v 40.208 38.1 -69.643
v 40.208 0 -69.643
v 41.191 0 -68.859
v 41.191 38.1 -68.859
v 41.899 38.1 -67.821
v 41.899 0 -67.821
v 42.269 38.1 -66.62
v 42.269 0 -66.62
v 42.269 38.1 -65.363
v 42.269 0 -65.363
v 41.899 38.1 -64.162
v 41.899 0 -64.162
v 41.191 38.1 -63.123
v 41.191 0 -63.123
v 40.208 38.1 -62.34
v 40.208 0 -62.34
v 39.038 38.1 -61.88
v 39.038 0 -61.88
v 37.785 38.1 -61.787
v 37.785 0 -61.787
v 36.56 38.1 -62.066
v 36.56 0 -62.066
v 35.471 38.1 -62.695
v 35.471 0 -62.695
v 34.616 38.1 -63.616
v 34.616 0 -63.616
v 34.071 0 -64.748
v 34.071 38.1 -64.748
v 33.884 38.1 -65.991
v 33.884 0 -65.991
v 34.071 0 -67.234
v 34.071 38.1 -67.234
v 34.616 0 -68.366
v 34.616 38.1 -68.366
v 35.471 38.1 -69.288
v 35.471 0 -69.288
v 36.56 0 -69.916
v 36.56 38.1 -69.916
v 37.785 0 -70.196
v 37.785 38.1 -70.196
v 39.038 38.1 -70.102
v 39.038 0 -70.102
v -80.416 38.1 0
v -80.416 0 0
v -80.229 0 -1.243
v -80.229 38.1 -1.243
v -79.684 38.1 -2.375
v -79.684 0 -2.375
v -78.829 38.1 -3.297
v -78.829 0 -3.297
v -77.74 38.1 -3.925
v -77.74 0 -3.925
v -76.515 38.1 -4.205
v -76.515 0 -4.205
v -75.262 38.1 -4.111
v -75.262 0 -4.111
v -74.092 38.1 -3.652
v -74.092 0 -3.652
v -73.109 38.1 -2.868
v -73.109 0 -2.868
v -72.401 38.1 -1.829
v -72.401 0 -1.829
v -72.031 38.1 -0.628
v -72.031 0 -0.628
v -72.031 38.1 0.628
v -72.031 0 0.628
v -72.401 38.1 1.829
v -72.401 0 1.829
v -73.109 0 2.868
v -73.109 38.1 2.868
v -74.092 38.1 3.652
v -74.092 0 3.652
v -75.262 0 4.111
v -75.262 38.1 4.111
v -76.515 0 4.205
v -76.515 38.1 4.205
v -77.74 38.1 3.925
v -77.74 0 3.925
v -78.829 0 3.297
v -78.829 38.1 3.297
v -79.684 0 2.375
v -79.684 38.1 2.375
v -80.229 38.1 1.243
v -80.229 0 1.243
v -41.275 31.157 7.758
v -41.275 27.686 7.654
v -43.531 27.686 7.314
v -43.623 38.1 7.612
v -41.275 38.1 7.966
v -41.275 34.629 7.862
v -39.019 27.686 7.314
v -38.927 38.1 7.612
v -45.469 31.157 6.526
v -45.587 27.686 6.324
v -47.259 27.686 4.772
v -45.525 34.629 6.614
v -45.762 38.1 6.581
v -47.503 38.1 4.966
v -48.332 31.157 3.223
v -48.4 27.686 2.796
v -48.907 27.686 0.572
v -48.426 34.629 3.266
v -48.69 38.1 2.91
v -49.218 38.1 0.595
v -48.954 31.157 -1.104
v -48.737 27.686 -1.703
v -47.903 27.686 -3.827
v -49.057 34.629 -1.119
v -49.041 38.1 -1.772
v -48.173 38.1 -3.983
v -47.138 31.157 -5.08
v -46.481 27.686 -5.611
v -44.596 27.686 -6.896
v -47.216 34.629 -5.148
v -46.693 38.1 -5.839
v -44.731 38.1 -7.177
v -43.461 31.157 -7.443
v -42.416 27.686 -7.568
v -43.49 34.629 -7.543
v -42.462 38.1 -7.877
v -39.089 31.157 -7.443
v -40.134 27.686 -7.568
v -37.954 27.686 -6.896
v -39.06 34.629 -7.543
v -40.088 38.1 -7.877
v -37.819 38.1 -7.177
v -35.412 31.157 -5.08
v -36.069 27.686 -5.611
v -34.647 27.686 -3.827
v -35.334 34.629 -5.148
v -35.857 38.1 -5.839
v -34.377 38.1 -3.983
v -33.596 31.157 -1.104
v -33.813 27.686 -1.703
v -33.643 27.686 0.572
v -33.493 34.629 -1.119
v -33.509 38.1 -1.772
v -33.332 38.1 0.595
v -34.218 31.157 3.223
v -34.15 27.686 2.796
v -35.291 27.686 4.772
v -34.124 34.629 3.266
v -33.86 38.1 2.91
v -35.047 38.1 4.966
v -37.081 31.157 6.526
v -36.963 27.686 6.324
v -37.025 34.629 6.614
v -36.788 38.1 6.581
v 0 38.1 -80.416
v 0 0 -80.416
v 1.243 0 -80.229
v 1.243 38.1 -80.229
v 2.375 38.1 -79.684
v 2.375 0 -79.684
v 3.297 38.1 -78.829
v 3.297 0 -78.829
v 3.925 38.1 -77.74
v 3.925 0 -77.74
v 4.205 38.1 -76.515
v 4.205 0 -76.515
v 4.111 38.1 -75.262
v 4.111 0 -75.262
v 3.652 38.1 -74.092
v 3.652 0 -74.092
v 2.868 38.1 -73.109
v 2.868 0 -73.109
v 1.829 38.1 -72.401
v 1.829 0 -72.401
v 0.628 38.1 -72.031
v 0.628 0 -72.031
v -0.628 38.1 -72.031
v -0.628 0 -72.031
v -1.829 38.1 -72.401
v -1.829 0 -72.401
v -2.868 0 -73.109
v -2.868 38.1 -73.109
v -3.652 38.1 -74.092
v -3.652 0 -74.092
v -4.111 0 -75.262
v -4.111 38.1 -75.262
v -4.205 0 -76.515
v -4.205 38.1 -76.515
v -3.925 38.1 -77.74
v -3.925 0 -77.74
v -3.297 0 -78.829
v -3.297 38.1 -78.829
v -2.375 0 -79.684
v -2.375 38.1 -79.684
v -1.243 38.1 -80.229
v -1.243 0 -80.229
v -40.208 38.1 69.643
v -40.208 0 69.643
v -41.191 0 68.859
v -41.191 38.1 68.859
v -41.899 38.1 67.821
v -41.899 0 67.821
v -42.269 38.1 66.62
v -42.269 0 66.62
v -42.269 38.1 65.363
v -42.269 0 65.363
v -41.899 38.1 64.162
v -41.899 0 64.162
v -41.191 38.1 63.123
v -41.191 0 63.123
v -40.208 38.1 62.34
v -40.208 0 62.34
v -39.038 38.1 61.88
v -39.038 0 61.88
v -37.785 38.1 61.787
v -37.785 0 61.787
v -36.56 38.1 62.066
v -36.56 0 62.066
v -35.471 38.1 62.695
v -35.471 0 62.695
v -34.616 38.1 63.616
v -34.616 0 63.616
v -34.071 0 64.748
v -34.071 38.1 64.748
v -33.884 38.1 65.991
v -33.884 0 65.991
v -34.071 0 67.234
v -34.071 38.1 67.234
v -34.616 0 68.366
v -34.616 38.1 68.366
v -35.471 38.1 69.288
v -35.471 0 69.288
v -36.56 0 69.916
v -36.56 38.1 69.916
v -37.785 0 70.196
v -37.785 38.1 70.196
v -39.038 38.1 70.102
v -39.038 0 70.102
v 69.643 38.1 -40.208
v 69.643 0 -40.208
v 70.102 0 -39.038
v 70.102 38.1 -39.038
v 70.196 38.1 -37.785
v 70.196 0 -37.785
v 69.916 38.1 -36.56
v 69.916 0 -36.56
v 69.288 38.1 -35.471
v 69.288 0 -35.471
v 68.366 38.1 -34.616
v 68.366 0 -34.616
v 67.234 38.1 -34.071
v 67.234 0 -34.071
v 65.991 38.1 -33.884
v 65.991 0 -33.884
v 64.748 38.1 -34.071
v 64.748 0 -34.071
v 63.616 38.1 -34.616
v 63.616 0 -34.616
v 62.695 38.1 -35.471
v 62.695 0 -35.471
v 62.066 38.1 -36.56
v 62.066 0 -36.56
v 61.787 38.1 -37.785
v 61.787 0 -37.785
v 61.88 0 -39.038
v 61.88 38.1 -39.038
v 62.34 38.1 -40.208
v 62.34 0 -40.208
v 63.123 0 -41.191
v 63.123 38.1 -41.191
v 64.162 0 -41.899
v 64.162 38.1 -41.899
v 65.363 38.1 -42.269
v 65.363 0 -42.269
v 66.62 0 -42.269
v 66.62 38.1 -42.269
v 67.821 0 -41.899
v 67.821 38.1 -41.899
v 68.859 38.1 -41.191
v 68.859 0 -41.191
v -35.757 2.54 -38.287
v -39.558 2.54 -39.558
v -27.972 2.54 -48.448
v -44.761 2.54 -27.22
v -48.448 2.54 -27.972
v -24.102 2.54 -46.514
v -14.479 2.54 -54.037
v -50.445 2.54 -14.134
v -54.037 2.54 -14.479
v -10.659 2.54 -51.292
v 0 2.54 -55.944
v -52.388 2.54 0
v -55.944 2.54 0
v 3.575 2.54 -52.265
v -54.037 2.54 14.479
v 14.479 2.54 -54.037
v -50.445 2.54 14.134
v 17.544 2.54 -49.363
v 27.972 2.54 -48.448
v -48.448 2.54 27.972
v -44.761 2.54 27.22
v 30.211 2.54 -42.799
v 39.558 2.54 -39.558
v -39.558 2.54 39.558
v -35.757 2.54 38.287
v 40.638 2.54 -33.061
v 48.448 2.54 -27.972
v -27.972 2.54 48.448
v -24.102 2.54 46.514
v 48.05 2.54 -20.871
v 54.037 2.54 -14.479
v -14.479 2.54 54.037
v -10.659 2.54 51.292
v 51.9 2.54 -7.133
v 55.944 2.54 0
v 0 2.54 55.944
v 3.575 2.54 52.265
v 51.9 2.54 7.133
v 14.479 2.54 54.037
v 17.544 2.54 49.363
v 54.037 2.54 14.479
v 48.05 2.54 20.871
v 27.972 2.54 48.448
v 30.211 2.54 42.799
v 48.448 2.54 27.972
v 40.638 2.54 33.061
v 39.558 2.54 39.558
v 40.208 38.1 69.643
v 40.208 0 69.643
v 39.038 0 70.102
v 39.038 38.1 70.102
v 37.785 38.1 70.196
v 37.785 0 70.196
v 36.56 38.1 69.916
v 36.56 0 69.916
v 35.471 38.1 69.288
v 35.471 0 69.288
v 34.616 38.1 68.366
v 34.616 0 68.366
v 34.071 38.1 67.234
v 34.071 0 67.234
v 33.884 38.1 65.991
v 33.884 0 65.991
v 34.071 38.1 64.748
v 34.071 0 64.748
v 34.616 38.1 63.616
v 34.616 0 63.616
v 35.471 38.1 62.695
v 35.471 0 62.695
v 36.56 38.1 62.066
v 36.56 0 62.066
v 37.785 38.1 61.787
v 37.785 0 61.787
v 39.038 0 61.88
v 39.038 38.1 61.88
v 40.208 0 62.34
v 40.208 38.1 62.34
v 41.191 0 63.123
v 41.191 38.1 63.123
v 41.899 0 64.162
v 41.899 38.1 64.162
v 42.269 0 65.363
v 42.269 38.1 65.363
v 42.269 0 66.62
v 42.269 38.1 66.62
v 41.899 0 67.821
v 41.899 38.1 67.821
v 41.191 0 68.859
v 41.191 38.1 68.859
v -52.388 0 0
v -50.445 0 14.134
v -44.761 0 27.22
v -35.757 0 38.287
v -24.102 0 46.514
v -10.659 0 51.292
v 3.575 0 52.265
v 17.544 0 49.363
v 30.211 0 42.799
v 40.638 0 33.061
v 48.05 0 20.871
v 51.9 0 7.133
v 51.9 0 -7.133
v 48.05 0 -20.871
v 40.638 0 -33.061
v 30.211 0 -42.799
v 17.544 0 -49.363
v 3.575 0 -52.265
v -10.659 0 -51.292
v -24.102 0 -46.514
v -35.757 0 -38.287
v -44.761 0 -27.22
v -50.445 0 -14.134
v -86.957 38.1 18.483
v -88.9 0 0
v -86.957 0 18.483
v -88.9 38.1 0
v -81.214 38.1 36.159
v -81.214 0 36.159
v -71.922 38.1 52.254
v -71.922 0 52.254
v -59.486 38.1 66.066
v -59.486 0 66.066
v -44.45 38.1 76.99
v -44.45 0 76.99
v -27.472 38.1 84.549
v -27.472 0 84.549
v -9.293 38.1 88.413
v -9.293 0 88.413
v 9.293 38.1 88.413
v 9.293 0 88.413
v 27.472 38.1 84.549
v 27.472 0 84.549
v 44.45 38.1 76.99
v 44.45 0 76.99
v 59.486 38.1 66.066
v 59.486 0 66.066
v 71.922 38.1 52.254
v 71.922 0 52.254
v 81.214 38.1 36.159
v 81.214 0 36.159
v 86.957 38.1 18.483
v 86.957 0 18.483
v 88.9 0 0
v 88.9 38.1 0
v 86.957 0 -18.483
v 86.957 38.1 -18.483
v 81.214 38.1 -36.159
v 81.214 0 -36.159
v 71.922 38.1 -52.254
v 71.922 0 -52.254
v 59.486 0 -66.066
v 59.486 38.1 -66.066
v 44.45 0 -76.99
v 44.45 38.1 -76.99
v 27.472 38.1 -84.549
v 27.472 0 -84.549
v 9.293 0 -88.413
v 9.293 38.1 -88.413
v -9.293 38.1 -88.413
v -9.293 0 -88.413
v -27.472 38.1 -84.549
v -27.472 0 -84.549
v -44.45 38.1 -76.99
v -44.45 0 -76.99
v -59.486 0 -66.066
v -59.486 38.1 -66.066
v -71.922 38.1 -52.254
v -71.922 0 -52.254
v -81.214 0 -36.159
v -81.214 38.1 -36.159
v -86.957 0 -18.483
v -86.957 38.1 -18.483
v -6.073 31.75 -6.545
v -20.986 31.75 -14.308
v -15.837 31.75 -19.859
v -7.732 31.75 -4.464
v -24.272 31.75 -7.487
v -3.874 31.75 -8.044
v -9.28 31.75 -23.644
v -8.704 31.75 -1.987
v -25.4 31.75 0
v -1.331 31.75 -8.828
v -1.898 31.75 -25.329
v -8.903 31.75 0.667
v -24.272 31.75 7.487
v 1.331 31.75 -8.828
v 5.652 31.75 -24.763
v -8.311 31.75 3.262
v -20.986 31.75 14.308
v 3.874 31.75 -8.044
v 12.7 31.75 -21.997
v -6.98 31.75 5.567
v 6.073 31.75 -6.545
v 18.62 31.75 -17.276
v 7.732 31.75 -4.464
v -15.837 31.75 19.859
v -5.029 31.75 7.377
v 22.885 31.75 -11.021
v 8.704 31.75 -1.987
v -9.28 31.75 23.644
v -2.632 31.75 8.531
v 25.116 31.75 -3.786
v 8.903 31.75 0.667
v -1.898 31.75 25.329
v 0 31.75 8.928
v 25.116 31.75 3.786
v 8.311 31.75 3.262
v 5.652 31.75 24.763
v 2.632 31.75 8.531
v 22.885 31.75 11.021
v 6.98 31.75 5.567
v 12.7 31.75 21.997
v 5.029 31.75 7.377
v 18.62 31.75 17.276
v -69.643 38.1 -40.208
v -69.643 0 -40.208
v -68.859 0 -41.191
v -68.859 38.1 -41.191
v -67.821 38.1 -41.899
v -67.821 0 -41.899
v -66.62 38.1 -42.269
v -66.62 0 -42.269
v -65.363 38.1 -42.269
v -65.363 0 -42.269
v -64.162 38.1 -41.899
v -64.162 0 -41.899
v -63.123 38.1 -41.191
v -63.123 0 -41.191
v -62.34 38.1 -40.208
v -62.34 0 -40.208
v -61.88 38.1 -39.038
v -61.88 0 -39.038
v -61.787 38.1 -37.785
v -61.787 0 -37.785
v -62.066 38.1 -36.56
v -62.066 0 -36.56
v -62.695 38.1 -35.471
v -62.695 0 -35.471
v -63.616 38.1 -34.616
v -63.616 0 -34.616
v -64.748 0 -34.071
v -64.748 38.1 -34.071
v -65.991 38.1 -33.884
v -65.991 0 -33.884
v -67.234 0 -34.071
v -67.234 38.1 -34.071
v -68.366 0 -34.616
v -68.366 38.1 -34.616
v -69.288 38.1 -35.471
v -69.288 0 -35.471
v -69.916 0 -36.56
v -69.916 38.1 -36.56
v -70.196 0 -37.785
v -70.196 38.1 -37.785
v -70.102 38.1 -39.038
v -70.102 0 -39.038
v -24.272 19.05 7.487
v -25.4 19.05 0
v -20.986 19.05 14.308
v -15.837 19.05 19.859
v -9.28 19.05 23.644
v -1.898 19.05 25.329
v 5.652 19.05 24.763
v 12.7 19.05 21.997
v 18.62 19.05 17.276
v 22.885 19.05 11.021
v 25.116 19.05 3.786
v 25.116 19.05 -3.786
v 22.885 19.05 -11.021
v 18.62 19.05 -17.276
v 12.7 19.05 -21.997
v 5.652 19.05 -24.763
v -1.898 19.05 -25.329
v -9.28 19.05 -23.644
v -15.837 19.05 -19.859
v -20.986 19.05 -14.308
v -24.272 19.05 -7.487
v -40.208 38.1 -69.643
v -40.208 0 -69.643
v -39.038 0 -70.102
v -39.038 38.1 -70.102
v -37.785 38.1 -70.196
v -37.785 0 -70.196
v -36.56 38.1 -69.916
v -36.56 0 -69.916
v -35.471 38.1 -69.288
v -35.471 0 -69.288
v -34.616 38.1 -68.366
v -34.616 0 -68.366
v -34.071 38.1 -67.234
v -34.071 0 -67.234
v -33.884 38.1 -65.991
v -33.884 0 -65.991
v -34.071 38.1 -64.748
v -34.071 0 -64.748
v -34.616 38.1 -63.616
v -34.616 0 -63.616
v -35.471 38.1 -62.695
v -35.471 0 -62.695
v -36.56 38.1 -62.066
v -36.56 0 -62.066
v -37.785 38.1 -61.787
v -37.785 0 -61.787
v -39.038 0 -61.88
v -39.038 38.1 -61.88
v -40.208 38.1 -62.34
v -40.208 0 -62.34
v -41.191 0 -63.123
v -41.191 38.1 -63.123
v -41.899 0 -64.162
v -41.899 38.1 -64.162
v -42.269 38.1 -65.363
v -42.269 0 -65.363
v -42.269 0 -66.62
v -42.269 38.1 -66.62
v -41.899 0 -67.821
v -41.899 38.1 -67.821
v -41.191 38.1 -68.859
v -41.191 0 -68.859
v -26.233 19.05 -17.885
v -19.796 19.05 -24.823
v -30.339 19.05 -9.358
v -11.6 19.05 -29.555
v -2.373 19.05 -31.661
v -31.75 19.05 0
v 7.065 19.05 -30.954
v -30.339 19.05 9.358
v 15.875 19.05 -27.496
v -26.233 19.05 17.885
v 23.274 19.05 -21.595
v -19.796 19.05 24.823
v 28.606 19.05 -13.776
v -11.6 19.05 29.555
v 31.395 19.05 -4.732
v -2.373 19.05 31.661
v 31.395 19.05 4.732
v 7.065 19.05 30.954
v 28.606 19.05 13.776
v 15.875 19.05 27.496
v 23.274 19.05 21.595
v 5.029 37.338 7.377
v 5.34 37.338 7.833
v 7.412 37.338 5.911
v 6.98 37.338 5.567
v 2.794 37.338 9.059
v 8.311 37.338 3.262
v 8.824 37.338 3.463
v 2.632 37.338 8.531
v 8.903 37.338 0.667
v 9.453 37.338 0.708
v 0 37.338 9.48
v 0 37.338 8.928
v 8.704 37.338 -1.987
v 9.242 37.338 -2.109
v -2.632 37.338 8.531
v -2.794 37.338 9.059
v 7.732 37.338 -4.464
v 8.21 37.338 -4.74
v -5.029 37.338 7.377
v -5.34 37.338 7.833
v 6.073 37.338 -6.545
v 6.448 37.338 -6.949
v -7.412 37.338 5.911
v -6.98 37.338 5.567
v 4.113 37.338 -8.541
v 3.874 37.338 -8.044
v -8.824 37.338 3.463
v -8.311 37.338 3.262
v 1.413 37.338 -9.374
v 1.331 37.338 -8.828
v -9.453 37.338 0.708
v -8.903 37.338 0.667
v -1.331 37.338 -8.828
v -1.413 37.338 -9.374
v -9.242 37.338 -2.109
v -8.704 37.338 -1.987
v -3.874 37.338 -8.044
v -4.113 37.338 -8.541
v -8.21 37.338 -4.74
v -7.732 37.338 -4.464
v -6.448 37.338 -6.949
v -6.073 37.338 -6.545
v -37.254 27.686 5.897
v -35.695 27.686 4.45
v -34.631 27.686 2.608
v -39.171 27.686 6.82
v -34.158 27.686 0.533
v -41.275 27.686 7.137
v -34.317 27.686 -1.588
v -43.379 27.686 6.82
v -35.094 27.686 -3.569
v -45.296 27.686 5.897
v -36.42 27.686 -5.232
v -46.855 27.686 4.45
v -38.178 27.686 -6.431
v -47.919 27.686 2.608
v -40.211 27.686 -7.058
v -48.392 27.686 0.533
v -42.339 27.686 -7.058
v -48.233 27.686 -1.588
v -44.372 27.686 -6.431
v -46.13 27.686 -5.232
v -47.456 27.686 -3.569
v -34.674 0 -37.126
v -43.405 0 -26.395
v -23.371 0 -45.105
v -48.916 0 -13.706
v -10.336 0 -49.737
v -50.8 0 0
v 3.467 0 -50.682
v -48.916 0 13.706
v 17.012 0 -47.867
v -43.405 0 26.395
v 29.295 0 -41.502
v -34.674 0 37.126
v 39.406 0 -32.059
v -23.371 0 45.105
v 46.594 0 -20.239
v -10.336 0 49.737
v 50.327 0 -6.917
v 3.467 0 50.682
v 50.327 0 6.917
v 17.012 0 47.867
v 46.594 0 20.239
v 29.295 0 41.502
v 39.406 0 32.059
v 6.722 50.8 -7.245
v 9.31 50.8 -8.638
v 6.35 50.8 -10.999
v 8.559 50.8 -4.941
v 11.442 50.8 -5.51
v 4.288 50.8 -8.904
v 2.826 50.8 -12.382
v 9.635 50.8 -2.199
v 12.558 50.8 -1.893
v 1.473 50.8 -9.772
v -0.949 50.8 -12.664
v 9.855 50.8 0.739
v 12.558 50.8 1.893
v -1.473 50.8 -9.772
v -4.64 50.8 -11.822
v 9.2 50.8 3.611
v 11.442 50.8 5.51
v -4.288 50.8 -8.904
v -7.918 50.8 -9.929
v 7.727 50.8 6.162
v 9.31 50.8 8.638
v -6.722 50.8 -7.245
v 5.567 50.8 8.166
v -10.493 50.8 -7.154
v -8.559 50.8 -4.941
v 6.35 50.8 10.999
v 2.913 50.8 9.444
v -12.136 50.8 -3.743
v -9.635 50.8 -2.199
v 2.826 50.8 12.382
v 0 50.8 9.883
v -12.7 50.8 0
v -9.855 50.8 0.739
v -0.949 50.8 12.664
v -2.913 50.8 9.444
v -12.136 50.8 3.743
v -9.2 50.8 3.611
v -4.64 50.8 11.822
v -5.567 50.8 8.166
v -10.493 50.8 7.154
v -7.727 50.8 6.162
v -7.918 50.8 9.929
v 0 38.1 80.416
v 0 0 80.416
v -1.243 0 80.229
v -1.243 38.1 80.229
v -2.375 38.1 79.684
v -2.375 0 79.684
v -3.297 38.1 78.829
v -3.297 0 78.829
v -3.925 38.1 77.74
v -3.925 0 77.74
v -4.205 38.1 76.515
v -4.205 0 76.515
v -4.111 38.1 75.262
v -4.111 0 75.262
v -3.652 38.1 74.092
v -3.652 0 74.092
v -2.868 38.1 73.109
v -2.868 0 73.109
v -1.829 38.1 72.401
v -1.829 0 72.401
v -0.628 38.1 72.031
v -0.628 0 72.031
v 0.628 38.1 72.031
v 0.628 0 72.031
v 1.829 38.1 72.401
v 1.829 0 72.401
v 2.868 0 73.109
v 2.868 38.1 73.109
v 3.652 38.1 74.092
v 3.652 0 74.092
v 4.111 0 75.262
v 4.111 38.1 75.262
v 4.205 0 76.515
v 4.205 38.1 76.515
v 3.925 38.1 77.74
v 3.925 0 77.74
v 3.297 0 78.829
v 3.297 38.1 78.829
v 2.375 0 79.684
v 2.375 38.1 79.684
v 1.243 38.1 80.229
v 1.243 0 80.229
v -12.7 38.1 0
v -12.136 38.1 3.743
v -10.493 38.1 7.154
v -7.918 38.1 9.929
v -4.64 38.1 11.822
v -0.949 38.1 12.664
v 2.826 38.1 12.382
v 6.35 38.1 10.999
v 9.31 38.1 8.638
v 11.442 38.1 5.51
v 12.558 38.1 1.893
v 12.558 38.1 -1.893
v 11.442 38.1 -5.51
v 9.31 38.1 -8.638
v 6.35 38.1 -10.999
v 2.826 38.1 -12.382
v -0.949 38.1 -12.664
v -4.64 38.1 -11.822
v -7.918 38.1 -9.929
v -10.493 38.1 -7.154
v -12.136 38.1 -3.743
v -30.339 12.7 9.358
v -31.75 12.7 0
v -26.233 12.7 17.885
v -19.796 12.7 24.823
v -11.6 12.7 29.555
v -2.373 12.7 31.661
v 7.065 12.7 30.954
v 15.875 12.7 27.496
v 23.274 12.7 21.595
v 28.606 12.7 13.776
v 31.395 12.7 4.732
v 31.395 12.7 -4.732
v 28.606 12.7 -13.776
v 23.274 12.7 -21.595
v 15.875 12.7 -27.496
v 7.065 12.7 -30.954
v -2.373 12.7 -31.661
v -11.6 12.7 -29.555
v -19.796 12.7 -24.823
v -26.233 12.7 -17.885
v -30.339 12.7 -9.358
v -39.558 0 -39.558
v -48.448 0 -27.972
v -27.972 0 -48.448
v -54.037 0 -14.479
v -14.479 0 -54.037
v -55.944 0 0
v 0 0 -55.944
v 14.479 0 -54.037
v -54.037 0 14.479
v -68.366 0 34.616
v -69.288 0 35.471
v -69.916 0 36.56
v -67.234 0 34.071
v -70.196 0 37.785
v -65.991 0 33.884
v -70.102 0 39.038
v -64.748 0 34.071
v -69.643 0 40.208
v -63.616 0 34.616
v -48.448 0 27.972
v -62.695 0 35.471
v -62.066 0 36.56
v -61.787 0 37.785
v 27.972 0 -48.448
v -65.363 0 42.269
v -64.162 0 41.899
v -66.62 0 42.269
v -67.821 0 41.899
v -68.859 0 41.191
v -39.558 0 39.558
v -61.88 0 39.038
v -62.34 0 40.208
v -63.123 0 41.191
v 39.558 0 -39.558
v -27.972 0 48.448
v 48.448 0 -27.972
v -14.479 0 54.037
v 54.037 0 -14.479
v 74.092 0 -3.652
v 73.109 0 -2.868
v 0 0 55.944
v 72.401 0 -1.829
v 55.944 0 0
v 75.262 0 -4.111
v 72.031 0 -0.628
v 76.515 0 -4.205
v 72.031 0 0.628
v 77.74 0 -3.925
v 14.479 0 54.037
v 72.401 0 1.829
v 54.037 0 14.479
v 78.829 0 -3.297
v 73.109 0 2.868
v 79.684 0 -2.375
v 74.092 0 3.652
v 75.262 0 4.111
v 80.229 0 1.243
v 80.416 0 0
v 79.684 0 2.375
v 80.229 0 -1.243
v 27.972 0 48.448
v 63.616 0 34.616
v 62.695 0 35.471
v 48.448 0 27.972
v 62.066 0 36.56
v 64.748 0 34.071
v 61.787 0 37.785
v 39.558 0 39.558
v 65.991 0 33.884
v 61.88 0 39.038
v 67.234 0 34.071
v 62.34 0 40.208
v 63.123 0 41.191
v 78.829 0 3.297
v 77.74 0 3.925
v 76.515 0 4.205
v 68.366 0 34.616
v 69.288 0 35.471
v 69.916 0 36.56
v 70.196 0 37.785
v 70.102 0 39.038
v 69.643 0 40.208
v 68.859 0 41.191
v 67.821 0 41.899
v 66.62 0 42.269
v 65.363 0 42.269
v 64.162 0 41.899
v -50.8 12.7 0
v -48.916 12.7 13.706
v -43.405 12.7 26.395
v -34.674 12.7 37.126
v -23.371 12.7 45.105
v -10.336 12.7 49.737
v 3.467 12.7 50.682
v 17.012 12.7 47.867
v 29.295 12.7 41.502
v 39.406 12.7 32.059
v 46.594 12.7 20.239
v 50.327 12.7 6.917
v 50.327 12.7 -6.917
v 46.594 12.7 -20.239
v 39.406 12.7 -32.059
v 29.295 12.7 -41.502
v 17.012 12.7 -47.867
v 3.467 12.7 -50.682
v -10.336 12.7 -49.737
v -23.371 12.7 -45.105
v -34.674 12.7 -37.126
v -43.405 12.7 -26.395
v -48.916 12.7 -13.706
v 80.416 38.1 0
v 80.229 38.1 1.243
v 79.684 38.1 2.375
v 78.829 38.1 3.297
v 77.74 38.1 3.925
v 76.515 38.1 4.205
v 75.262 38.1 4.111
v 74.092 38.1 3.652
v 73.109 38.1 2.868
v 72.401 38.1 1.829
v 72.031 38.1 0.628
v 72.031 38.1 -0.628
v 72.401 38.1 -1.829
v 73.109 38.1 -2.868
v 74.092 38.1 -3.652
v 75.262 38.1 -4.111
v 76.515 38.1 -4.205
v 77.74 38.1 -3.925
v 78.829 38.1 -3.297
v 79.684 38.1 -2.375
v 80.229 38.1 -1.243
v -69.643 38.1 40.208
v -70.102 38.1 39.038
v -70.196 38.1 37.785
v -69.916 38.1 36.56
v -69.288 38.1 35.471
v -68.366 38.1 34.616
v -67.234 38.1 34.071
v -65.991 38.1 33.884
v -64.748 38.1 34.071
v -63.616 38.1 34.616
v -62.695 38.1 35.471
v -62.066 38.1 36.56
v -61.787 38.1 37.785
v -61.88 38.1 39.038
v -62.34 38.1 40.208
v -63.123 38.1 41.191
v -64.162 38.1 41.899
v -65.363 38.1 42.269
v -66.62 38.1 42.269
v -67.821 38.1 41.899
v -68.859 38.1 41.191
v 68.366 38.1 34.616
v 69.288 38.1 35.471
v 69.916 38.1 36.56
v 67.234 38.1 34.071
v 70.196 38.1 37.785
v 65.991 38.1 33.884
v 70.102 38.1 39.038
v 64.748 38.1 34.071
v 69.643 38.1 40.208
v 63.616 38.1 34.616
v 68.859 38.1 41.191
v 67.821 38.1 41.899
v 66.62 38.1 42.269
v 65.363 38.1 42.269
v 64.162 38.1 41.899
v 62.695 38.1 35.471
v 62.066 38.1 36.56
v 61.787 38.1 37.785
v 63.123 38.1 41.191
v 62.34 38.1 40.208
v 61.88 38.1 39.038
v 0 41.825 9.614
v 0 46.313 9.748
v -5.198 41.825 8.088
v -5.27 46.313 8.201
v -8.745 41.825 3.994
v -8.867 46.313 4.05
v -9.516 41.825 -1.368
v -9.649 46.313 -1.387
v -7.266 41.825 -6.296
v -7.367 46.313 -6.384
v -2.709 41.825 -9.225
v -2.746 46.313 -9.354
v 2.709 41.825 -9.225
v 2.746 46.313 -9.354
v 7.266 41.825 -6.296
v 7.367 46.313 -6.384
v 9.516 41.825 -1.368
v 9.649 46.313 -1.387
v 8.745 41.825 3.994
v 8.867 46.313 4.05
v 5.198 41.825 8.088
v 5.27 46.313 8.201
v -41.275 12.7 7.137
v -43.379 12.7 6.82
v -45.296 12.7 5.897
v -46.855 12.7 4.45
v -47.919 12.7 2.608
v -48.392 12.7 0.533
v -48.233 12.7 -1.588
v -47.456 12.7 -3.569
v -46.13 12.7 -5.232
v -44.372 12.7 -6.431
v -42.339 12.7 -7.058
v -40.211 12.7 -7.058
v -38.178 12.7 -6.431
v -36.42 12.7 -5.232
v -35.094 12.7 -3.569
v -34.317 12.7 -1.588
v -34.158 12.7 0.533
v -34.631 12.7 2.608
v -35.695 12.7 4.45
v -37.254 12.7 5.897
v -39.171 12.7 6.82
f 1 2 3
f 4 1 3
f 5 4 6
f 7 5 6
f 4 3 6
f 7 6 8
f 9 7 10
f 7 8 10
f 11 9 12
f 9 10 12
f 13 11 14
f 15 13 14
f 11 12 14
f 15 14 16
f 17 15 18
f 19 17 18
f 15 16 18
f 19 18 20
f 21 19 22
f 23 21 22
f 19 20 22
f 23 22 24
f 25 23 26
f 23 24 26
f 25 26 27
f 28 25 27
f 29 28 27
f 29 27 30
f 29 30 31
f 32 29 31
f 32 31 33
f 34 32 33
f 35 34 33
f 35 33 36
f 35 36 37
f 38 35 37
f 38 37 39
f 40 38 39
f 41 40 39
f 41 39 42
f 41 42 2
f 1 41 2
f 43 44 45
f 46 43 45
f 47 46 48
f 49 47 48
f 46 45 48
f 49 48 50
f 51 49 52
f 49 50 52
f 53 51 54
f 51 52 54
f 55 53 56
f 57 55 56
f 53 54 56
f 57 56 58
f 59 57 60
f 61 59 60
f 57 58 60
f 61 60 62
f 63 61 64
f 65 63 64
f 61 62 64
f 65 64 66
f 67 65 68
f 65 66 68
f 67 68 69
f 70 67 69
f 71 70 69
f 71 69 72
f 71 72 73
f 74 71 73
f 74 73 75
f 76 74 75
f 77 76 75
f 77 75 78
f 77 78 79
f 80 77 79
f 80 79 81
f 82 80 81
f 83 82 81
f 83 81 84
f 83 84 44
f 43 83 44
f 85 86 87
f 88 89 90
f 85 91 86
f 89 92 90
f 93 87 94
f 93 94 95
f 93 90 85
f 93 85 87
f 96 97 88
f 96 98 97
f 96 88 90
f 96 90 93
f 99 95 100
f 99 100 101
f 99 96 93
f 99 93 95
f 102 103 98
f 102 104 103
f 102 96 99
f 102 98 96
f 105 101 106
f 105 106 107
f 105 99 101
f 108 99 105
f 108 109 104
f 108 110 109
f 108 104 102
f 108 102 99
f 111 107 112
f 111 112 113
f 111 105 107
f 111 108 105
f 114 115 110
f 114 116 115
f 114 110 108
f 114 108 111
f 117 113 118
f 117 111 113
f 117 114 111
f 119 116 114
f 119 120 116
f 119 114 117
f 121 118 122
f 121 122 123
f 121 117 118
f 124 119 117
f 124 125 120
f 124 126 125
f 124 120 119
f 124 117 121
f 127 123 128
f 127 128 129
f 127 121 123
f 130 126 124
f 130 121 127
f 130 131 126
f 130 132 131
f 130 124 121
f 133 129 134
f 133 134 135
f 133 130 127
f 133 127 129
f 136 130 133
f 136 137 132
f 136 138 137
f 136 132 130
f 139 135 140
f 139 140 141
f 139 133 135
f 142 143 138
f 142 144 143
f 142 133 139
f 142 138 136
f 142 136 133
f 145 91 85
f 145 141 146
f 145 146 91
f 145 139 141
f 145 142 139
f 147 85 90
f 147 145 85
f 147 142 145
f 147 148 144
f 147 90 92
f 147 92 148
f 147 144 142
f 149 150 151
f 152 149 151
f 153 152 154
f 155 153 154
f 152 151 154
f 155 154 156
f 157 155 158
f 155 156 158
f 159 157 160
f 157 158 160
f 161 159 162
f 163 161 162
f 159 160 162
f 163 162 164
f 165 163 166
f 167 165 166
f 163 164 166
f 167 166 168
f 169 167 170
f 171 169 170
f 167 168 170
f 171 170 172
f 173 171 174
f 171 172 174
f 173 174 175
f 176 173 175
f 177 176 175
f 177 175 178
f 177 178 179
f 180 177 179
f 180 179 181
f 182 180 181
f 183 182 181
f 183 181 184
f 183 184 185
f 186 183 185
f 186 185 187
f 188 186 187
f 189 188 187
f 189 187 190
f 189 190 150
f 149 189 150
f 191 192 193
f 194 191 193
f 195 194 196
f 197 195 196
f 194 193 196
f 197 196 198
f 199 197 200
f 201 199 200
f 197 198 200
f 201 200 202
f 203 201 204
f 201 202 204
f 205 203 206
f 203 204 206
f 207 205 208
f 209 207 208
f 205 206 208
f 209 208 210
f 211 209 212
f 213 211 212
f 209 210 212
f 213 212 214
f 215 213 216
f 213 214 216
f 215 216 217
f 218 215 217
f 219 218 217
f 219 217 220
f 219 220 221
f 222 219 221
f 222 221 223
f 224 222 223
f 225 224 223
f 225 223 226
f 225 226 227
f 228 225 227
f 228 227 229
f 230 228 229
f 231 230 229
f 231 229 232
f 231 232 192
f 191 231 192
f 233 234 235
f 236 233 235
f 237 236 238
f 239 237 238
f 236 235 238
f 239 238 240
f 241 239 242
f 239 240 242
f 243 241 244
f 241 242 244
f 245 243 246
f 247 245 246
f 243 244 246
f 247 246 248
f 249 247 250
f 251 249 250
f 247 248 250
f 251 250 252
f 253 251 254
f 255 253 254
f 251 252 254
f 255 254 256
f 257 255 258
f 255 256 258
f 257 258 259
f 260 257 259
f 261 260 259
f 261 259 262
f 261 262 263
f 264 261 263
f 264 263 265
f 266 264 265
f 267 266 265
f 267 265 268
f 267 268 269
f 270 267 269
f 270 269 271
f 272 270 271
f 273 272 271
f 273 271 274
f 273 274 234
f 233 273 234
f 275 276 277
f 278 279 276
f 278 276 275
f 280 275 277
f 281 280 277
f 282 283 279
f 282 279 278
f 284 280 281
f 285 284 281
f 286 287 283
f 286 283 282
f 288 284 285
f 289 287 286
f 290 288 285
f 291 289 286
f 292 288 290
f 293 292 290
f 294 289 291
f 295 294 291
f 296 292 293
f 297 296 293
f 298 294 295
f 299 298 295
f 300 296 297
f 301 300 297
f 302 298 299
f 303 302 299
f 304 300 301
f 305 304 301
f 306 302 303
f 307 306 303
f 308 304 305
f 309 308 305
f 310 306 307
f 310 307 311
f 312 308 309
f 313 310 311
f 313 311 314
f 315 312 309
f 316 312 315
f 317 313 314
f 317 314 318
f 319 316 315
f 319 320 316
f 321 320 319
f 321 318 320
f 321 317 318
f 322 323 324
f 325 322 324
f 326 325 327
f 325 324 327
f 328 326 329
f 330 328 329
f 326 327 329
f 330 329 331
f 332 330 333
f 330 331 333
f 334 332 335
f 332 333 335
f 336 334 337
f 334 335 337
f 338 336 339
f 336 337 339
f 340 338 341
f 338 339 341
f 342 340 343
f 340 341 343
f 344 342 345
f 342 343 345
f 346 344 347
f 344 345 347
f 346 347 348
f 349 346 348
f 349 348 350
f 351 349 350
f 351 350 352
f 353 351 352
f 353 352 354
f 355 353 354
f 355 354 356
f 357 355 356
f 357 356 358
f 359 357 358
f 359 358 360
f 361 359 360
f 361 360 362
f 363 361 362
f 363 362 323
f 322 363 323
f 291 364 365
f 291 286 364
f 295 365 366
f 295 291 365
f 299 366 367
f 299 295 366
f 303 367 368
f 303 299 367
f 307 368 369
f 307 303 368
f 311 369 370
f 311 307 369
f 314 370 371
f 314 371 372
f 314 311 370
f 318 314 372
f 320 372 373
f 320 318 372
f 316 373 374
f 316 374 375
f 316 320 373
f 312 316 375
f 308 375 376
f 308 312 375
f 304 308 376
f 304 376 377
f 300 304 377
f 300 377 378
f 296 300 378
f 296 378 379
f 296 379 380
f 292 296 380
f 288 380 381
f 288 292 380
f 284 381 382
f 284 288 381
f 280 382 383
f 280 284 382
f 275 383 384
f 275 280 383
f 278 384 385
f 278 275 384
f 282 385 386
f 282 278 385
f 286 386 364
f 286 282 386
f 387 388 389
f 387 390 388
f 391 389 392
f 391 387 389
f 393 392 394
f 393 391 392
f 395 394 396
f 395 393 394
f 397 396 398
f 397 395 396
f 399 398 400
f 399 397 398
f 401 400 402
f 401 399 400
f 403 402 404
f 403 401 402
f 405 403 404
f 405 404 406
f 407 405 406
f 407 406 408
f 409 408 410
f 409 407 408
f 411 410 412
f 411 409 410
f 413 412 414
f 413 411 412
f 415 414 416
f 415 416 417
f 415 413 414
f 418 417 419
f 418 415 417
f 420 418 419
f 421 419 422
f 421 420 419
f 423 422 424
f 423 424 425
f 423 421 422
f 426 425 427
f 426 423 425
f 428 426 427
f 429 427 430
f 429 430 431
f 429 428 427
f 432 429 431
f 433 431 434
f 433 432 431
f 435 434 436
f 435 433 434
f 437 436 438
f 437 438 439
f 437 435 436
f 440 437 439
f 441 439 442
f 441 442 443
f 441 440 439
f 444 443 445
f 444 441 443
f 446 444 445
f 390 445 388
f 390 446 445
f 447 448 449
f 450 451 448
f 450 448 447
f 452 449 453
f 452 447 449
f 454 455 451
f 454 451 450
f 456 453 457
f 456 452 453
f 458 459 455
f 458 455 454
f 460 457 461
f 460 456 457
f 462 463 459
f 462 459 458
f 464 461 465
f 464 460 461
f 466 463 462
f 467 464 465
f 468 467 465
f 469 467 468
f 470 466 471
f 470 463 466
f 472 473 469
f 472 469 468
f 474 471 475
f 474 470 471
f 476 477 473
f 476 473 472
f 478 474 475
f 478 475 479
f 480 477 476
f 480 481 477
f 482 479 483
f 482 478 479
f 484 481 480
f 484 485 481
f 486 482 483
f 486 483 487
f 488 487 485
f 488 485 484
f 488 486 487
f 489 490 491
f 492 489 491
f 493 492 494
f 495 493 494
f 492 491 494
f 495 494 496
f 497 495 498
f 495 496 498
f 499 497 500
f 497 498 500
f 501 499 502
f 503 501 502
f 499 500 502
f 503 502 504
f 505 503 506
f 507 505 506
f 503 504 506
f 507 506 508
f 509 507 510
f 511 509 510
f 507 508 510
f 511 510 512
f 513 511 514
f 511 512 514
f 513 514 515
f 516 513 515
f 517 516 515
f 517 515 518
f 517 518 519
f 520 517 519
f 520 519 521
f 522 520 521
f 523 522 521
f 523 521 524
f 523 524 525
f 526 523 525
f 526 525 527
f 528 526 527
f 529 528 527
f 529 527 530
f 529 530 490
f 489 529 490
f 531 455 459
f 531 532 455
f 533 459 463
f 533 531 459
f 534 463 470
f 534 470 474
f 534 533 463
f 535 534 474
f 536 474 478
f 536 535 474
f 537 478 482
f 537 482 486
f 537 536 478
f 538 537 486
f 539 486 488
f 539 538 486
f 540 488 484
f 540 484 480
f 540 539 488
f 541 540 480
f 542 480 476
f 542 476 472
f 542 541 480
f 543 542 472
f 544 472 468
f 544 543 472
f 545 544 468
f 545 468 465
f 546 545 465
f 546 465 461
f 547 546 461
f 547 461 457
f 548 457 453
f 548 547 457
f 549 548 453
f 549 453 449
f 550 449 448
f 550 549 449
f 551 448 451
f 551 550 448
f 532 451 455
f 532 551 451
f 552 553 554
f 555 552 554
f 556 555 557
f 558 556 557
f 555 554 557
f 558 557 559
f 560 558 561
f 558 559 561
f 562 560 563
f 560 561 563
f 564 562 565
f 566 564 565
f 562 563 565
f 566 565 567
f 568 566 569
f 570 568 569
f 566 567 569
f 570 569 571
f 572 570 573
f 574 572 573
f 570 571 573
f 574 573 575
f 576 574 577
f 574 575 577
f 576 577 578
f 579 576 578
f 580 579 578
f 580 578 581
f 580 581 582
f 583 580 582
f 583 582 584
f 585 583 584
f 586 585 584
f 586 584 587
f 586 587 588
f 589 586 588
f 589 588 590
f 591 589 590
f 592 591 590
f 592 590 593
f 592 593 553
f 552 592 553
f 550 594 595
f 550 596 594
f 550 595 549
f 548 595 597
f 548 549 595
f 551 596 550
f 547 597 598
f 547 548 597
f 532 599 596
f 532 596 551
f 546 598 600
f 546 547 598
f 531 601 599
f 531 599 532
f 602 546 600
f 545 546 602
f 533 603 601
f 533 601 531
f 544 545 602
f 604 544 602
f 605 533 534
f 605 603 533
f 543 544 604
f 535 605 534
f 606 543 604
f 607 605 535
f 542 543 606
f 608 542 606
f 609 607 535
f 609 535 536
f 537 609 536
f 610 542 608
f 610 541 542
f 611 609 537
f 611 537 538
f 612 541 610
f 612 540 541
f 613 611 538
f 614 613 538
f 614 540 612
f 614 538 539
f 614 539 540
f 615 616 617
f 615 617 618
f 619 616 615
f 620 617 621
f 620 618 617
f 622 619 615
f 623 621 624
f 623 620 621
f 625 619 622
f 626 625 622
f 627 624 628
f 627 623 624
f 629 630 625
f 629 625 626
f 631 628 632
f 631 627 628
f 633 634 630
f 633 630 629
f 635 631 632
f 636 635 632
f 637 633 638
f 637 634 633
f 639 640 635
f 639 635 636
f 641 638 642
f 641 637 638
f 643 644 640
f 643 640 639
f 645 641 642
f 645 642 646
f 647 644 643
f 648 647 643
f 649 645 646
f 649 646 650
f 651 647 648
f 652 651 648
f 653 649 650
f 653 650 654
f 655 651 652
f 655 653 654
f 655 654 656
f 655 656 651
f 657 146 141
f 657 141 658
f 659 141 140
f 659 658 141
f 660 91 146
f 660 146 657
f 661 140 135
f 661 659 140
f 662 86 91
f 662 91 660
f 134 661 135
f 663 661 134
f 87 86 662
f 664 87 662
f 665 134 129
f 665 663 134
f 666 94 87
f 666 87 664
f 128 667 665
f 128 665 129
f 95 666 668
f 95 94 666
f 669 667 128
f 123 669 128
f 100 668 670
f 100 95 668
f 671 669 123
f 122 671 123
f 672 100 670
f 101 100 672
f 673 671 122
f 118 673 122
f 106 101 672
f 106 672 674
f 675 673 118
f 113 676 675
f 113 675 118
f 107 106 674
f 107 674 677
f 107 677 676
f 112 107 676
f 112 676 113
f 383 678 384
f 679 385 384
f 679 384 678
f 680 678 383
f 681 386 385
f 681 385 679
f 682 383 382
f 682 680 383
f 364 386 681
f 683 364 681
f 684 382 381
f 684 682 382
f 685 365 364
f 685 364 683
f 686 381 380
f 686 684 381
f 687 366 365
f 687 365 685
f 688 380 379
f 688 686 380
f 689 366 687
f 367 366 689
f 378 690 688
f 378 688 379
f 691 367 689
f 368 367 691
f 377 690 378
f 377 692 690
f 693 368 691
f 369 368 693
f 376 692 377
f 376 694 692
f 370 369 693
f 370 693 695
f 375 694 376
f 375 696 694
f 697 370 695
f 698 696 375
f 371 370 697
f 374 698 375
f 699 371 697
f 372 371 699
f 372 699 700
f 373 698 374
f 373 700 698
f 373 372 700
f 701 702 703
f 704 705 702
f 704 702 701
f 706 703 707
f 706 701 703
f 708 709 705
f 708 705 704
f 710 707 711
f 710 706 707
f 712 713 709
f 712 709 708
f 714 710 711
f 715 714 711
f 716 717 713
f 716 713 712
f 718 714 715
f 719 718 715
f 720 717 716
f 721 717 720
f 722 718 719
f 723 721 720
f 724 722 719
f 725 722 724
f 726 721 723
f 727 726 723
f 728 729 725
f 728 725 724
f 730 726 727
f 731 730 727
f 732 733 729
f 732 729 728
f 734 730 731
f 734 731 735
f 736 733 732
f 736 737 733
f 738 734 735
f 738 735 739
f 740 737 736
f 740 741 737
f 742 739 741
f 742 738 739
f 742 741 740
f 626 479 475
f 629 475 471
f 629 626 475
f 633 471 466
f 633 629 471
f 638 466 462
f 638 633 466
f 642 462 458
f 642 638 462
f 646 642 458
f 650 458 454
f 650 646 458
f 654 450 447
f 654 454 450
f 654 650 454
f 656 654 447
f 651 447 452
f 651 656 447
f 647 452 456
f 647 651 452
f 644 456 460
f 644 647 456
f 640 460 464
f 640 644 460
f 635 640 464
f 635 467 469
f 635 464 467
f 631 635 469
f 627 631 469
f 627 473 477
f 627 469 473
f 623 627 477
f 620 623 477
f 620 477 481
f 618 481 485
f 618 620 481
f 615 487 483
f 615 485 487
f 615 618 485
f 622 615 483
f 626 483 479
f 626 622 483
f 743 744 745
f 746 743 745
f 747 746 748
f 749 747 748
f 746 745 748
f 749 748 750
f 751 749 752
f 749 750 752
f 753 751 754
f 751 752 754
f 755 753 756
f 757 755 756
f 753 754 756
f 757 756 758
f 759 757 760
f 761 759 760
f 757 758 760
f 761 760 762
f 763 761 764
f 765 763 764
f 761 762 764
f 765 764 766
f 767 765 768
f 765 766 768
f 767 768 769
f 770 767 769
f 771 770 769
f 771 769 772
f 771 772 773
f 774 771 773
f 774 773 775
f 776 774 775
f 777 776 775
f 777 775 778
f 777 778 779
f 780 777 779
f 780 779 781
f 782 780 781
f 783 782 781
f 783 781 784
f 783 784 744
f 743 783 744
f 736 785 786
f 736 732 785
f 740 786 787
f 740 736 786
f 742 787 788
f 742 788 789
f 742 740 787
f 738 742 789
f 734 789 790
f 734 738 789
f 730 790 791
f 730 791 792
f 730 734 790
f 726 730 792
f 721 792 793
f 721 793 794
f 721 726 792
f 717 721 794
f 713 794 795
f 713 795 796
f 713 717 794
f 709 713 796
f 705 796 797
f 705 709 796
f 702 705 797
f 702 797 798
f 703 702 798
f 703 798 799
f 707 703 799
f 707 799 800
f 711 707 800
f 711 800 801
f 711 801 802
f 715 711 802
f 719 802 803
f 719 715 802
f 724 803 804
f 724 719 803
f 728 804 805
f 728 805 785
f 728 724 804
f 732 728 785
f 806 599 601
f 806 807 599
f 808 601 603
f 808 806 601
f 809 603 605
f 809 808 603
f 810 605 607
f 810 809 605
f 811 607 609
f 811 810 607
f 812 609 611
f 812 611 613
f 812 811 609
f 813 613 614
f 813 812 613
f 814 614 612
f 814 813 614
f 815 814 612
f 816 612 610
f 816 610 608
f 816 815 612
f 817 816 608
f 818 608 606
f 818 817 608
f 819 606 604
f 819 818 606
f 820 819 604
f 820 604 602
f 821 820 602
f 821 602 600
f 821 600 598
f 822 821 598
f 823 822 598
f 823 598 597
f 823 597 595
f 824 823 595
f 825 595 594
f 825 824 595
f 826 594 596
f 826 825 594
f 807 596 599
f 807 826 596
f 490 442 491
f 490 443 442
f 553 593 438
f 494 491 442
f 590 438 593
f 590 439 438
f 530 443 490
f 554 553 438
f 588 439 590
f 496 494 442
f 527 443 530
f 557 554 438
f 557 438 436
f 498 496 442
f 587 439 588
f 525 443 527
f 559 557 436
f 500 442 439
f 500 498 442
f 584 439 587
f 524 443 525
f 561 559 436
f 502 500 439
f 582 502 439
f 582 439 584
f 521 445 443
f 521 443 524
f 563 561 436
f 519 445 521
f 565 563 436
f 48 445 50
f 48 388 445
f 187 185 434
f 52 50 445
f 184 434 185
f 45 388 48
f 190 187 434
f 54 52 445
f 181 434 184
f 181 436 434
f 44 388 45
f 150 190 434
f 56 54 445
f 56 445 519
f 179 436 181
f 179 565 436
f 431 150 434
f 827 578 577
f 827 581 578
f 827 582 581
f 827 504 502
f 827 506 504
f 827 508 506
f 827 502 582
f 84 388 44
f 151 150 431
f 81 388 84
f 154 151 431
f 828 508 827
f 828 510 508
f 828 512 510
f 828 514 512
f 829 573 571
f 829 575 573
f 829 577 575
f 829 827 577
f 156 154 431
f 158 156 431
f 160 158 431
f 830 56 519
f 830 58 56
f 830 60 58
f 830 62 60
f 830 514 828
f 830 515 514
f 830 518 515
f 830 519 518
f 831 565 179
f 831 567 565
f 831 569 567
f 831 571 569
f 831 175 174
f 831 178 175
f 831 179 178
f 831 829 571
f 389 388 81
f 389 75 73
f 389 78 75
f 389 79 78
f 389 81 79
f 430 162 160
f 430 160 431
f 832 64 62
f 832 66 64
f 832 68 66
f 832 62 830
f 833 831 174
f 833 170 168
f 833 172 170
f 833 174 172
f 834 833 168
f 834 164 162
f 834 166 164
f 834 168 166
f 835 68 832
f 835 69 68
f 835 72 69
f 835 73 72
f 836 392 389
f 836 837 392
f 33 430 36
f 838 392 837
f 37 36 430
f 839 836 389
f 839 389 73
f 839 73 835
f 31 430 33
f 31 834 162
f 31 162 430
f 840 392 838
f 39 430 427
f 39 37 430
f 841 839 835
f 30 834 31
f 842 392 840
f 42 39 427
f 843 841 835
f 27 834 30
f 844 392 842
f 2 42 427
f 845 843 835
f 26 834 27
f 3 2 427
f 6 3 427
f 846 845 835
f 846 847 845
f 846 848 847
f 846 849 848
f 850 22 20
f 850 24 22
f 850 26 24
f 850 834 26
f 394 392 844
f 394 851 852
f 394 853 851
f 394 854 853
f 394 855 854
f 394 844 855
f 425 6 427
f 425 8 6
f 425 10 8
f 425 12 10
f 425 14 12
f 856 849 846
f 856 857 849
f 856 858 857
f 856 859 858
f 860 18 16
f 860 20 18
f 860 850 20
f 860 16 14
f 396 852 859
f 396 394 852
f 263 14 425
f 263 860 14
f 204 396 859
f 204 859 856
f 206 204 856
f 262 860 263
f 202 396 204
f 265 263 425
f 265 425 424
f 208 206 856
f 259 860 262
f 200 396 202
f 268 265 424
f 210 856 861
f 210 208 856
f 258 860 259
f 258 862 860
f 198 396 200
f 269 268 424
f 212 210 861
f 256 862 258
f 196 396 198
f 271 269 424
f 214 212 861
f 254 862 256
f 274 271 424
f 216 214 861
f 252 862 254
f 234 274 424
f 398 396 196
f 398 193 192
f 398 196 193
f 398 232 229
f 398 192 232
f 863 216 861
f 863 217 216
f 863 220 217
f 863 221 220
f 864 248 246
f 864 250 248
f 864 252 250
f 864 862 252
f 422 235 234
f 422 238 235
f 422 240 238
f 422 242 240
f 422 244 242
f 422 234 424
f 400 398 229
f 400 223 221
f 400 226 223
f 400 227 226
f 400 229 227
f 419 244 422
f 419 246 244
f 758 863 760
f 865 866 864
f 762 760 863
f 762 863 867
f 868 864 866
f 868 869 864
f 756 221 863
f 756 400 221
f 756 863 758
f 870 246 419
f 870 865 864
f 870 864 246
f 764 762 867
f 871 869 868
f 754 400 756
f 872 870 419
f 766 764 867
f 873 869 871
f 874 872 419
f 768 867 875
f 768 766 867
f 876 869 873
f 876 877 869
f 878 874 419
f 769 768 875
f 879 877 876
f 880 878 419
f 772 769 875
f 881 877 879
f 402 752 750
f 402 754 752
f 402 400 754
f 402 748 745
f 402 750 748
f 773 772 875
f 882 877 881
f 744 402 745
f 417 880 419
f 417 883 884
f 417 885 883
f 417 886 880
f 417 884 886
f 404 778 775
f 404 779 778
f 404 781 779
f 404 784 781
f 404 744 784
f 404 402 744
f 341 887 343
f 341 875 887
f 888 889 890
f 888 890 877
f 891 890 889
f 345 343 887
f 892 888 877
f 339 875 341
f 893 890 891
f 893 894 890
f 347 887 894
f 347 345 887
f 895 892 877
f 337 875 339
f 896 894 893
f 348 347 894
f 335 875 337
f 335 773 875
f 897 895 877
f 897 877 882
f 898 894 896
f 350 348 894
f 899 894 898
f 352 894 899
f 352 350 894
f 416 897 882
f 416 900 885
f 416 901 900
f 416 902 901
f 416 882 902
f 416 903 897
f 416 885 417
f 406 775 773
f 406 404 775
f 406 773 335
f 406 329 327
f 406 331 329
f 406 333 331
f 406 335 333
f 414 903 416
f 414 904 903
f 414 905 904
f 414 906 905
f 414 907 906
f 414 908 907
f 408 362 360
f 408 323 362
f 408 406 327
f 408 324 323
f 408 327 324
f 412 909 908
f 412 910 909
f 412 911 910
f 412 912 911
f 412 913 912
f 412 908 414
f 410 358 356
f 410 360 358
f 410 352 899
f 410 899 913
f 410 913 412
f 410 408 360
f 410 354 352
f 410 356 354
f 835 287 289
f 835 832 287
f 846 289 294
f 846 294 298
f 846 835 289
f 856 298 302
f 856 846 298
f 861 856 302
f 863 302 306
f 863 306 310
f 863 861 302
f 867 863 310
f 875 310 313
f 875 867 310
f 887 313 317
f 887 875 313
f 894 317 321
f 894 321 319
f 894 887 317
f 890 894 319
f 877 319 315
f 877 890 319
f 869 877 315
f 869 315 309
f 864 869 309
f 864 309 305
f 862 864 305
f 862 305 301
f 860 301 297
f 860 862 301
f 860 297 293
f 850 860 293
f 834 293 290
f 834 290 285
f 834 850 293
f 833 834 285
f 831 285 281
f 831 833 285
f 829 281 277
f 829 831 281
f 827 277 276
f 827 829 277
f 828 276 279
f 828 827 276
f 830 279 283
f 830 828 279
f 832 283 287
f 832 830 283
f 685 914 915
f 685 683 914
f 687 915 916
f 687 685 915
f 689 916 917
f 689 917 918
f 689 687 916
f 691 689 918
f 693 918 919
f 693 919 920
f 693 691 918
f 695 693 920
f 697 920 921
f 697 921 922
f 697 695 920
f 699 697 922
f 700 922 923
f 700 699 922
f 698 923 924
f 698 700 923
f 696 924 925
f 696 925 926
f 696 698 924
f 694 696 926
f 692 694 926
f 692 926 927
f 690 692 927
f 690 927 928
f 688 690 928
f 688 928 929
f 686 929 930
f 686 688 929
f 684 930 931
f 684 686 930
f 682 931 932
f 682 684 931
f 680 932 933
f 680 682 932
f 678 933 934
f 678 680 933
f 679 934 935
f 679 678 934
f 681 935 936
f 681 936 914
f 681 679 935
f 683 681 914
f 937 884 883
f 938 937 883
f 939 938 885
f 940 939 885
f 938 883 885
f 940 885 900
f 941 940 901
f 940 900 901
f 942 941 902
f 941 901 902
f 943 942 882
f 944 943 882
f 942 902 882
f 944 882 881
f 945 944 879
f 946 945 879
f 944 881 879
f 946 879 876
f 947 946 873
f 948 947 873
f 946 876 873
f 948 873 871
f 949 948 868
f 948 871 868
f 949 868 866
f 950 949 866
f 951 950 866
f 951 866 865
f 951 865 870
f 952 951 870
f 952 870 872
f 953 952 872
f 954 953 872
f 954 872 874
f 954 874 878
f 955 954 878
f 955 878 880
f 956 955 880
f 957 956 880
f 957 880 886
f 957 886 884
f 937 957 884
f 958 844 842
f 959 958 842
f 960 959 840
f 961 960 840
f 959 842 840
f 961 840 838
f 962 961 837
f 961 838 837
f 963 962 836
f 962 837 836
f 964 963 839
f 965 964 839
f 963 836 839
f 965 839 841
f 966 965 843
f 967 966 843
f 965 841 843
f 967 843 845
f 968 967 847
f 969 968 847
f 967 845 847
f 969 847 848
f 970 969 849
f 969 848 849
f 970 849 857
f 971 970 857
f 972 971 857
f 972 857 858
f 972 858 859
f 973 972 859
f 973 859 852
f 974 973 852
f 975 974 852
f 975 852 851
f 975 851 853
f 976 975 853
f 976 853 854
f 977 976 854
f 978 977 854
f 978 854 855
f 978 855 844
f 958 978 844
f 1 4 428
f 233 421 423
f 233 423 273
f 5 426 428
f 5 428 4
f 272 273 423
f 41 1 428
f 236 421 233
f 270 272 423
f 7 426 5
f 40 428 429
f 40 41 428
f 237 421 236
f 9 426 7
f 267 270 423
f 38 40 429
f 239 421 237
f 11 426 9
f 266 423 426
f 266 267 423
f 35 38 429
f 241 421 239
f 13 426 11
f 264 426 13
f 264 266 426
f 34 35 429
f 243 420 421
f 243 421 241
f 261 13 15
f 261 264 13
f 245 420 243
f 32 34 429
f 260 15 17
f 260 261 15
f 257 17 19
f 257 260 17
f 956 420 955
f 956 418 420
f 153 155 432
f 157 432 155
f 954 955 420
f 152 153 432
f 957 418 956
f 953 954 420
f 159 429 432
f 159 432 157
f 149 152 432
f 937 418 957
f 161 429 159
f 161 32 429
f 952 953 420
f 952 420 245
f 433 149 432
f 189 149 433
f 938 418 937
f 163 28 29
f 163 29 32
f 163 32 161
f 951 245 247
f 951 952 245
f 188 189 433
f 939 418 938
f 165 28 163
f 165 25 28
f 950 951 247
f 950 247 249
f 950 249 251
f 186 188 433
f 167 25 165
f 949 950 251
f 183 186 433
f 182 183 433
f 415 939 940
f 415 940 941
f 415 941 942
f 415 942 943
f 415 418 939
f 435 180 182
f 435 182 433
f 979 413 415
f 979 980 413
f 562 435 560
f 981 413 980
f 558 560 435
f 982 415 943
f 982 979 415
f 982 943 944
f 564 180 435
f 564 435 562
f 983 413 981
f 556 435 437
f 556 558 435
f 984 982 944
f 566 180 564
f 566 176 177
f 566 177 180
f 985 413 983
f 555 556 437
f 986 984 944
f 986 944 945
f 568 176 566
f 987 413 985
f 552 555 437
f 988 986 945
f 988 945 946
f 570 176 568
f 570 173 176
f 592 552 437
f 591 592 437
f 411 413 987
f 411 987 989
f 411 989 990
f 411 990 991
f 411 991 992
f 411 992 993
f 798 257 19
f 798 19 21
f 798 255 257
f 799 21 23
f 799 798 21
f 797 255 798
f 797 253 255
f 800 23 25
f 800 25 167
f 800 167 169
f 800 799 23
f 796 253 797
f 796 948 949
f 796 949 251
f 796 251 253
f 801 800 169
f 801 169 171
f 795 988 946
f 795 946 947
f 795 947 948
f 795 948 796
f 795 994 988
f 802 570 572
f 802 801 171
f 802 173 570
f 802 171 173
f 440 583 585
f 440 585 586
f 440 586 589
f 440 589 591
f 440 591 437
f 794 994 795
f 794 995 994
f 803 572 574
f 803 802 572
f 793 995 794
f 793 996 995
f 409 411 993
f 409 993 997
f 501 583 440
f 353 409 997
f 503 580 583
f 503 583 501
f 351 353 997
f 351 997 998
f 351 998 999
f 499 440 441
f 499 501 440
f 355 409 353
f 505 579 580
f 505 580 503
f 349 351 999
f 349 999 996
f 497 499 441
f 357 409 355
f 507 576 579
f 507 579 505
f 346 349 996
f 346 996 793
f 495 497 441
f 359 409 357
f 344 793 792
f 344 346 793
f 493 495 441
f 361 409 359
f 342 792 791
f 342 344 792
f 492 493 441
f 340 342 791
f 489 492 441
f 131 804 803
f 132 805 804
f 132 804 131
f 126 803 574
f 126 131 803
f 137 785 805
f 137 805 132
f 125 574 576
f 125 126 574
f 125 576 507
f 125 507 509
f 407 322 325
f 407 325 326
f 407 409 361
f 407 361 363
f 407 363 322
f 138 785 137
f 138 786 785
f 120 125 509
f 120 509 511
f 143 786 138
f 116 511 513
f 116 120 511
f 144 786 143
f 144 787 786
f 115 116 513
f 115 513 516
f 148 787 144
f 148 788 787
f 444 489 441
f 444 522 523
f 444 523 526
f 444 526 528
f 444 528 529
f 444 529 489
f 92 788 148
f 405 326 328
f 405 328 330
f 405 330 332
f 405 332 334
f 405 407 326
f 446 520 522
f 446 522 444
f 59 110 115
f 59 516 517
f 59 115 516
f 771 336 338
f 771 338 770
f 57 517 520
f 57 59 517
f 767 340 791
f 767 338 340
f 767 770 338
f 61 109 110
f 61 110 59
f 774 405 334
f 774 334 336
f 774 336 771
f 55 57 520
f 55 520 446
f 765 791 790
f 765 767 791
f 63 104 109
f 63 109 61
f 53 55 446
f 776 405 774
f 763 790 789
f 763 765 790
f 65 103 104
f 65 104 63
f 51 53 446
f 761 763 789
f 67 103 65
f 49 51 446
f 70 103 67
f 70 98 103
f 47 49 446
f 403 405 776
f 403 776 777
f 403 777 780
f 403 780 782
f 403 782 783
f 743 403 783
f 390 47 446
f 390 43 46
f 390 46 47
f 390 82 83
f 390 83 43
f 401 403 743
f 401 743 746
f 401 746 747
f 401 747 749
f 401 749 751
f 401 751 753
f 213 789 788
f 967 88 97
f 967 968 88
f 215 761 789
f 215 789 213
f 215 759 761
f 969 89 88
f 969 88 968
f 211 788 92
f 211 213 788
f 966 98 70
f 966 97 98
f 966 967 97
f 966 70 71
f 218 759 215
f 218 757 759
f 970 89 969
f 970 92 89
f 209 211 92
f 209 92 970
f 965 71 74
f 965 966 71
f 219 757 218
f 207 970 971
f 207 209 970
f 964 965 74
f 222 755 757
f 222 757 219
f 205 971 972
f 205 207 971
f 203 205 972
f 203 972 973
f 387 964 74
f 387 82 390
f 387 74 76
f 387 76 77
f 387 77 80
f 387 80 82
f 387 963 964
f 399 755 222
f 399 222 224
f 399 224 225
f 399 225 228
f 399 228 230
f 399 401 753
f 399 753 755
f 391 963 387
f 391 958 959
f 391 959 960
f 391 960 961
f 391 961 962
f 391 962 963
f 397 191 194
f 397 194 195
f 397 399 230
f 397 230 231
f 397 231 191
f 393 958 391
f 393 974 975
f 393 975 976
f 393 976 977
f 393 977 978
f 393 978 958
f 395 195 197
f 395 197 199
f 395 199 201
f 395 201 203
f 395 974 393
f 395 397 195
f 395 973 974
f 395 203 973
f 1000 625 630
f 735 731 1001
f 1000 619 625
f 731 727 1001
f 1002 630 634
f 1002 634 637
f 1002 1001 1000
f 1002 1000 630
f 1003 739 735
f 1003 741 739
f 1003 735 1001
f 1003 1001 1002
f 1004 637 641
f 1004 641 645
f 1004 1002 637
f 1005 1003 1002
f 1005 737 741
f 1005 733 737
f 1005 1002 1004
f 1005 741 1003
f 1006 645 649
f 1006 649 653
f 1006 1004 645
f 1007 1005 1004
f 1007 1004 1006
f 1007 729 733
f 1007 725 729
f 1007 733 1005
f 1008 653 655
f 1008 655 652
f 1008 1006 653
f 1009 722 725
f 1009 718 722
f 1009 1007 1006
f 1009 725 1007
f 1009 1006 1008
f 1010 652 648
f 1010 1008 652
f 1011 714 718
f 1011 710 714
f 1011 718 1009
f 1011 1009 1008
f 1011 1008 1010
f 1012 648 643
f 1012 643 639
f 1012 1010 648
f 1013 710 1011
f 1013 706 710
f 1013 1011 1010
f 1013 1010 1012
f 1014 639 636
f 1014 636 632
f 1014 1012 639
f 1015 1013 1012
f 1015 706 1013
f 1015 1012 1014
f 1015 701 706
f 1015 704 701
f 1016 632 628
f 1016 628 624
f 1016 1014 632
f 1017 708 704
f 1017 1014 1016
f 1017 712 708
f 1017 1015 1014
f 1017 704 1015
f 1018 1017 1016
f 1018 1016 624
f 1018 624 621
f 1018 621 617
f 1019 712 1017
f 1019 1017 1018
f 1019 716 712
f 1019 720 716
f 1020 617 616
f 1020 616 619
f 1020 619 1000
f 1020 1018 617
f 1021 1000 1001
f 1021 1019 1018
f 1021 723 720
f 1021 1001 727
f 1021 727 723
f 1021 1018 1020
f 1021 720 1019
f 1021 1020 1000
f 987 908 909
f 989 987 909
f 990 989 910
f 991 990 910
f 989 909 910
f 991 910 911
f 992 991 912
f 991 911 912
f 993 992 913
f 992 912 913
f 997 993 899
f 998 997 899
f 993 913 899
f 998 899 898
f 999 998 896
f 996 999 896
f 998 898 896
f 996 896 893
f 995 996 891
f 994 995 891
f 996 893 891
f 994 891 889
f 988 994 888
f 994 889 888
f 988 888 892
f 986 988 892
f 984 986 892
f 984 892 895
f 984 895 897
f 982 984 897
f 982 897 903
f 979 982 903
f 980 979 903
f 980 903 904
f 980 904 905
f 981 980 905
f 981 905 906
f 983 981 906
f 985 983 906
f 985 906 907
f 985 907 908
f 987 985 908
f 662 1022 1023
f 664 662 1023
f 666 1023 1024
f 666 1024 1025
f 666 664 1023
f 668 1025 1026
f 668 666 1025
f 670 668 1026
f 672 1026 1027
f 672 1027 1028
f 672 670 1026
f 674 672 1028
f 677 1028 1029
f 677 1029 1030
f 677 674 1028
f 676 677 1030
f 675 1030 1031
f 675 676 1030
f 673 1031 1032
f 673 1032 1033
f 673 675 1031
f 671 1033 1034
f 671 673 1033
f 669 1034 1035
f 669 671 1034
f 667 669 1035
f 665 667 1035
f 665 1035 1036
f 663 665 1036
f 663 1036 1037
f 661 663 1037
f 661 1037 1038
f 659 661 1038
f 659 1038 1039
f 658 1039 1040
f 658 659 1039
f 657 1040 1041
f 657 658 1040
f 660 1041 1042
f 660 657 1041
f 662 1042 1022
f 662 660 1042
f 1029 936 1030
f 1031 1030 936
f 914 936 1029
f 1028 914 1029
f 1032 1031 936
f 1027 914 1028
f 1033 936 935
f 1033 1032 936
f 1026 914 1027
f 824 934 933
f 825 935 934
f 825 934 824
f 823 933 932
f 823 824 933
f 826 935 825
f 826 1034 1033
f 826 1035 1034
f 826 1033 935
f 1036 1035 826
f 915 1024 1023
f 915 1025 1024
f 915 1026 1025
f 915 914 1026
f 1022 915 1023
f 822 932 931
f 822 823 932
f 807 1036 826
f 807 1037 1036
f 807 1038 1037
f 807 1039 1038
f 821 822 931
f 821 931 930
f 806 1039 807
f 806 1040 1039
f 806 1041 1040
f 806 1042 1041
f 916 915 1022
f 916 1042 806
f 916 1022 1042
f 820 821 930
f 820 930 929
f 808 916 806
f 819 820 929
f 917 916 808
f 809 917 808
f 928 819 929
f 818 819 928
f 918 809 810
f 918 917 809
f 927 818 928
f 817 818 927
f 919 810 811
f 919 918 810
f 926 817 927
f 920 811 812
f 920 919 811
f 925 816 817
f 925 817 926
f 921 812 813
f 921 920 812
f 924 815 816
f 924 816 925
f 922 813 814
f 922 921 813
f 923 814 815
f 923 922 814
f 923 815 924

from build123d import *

# Parameters (mm, degrees)
F_5_16_CLEARANCE_HOLE1_D = 8.4328
CIRPATTERN1_COUNT        = 12


with BuildPart() as part:
    # Sketch1 → Revolve1 (revolve)
    with BuildSketch(Plane.XY):
        Polygon((-55.9435, 0), (-88.9, 0), (-88.9, 38.1), (-12.7, 38.1), (-12.7, 50.8), (0, 50.8), (0, 31.75), (-25.4, 31.75), (-25.4, 19.05), (-31.75, 19.05), (-31.75, 12.7), (-50.8, 12.7), (-50.8, 0), (-52.3875, 0), (-52.3875, 2.54), (-55.9435, 2.54), align=None)
    revolve(axis=Axis((0, 0, 0), (0, 1, 0)))

    # Sketch8 → 1/2 NPT Tapped Hole1 (revolve, cut)
    with BuildSketch(Plane(origin=(0, 50.8, 0), x_dir=(0, 0, 1), z_dir=(1, 0, 0))):
        Polygon((0, 0), (0, 50.8), (8.9281, 50.8), (8.9281, 13.462), (9.479726792, 13.462), (9.8827971, 0), align=None)
    revolve(axis=Axis((0, 57.15, 0), (0, -1, 0)), mode=Mode.SUBTRACT)

    # Sketch3 → 3/8 NPT Tapped Hole1 (revolve, cut)
    with BuildSketch(Plane(origin=(-41.275, 38.1, 0), x_dir=(0, 0, 1), z_dir=(1, 0, 0))):
        Polygon((0, 0), (0, 29.688582582), (7.1374, 25.4), (7.1374, 10.414), (7.653732494, 10.414), (7.9655416, 0), align=None)
    revolve(axis=Axis((-41.275, 44.45, 0), (0, -1, 0)), mode=Mode.SUBTRACT)

    # 5/16 Clearance Hole1 (through all)
    with Locations(Plane(origin=(0, 38.1, 0), x_dir=(1, 0, 0), z_dir=(0, 1, 0))):
        with Locations((-76.2, 0)):
            f_5_16_clearance_hole1 = Hole(F_5_16_CLEARANCE_HOLE1_D / 2)

    # CirPattern1: 5/16 Clearance Hole1 ×12 about axis
    cirpattern1_axis = Axis((0, 0, 0), (0, 1, 0))
    for i in range(1, CIRPATTERN1_COUNT):
        add(f_5_16_clearance_hole1.rotate(cirpattern1_axis, i * 360 / CIRPATTERN1_COUNT), mode=Mode.SUBTRACT)


solid = part.part
